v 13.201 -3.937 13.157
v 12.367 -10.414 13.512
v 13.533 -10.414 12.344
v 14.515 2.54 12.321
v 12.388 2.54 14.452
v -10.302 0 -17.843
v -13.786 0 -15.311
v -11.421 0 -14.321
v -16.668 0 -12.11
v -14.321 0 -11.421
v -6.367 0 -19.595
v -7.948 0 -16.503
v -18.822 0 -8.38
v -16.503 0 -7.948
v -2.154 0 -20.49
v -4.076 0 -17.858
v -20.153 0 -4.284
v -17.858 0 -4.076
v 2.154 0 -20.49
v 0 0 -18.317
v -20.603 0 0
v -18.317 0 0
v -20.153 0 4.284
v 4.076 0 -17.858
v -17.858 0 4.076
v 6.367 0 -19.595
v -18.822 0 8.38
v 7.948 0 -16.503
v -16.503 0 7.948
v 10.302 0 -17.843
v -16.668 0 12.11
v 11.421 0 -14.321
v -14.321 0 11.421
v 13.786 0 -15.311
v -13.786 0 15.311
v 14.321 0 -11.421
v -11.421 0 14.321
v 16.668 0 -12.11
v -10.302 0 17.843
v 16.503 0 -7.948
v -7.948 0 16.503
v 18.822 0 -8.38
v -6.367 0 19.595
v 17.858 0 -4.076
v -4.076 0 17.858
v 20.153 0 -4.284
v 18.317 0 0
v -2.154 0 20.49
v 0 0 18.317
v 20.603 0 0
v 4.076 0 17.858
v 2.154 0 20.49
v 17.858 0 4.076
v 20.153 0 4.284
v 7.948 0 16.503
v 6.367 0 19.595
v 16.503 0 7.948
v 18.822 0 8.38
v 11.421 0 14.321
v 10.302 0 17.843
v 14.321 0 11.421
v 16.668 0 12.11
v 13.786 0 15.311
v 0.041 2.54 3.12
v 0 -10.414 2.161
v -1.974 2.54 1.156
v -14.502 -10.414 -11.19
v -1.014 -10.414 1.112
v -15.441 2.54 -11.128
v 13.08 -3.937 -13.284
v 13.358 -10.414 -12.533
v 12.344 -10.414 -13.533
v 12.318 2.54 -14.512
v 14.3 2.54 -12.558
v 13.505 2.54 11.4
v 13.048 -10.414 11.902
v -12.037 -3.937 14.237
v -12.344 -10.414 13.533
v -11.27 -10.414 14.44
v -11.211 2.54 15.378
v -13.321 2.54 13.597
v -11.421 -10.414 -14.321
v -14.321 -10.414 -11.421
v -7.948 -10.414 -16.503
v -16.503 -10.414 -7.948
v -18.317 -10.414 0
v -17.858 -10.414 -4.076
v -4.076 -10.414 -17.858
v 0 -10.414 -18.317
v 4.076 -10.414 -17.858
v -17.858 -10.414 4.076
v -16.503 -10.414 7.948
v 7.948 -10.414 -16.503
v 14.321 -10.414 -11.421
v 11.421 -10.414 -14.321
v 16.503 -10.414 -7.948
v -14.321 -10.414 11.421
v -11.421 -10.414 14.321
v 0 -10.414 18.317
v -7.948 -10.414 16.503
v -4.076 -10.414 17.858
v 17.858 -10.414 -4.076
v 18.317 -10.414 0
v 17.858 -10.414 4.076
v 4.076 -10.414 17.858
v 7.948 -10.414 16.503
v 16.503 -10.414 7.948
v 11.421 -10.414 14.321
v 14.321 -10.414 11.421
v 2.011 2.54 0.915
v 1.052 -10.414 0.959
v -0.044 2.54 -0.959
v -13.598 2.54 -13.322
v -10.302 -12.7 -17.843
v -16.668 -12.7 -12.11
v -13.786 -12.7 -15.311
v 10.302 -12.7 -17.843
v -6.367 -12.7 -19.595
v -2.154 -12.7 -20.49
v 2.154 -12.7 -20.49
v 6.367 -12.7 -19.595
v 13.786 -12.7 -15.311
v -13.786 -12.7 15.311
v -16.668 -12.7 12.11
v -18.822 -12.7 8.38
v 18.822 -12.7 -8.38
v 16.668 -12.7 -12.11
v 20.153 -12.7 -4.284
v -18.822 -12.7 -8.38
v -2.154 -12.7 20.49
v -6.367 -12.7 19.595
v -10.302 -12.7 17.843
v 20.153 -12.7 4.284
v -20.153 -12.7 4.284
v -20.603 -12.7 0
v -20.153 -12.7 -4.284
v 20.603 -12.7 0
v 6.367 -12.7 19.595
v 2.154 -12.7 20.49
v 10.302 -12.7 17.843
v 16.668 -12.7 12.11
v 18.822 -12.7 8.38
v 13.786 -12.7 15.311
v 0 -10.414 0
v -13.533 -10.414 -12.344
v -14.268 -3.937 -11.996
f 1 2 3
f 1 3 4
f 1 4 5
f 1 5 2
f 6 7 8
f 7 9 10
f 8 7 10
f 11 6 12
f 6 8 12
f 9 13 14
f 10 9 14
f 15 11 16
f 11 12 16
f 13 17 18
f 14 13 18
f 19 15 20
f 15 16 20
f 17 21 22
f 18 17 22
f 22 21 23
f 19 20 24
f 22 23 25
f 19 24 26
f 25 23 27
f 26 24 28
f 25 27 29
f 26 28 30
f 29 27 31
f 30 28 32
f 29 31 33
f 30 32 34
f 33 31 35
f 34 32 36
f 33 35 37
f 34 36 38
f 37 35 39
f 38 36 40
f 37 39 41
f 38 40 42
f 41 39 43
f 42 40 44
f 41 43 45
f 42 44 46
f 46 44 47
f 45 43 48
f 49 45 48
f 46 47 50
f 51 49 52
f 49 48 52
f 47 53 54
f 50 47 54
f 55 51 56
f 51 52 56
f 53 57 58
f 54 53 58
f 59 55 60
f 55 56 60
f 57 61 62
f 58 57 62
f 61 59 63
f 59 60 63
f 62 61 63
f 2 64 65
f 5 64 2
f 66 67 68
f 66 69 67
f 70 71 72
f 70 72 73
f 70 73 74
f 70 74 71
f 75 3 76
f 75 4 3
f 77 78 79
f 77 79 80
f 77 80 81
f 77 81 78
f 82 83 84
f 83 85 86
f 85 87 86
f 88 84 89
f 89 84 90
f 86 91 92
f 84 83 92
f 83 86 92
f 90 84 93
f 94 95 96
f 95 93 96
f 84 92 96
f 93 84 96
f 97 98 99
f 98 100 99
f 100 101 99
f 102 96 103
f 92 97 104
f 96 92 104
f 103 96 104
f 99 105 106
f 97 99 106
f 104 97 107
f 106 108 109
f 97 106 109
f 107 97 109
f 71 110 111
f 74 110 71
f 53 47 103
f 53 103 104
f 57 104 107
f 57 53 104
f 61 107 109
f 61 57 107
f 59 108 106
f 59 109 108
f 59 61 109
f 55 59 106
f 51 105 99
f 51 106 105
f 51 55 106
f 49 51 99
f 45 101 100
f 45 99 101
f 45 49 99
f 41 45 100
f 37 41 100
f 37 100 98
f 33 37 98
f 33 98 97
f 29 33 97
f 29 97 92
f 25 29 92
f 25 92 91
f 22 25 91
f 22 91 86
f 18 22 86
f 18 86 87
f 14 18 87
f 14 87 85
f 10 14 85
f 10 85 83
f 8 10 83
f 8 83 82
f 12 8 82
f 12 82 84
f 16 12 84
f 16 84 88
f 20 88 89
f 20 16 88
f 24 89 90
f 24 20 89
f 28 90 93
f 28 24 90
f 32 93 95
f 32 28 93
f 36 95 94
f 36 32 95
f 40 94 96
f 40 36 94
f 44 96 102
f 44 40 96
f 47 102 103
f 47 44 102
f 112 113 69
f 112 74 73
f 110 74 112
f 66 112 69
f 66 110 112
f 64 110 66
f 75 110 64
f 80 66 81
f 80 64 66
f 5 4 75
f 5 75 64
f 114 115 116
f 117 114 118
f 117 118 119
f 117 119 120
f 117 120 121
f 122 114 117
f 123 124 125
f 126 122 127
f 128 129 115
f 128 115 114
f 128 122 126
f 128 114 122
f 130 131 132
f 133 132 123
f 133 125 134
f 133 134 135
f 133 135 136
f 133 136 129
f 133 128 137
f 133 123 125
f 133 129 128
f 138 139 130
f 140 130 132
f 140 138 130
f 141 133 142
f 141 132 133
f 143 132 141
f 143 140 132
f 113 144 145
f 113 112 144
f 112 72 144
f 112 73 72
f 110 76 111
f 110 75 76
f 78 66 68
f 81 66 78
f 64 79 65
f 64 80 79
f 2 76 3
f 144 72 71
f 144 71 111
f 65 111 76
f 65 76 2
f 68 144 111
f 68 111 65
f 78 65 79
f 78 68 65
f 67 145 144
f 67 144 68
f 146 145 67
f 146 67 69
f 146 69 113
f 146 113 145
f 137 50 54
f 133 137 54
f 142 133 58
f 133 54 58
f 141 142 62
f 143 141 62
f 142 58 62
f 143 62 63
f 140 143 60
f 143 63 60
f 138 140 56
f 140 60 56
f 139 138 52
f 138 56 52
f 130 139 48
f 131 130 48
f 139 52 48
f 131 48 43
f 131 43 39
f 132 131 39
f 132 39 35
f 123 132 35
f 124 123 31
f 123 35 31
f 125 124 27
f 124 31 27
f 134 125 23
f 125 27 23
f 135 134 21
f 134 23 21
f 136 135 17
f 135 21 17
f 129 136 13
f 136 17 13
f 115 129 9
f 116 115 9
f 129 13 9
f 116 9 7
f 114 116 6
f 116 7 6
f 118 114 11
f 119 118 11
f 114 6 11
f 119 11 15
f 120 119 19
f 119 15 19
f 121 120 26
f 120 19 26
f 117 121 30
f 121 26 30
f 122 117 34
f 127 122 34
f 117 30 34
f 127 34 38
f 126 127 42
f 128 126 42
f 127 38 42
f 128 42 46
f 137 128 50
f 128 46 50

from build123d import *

# Parameters (mm, degrees)
F0_R     = 20.6032512537
F1_DEPTH = 12.7
F2_T     = -2.286
F4_DEPTH = 12.954
F4_TAPER = -3


with BuildPart() as f1:
    # F0 (on Front) → F1 (new body)
    with BuildSketch(Plane.XZ):
        Circle(F0_R)
    extrude(amount=F1_DEPTH)

    # F2
    f2_openings = [f1.faces().sort_by_distance(p)[0] for p in [
        (0, 0, 0),
    ]]
    offset(amount=F2_T, openings=f2_openings)


with BuildPart() as f4:
    # F3 (on face) → F4 (new body)
    with BuildSketch(Plane(origin=(0, -10.414, 0), x_dir=(-1, 0, 0), z_dir=(0, 1, 0))):
        Polygon((-12.3441766776, -13.5330334975), (0, 0), (13.5330334975, -12.3441766776), (14.5017178557, -11.1902579383), (1.014461328, 1.112163208), (12.3441766776, 13.5330334975), (11.2704234996, 14.4395030258), (0, 2.1605880465), (-12.3671734121, 13.51202114), (-13.5330334975, 12.3441766776), (-13.0478517911, 11.9016174609), (-1.0516488317, 0.9592630494), (-13.3584970167, -12.5328468812), align=None)
    extrude(amount=F4_DEPTH, taper=F4_TAPER)


solid = Compound([f1.part, f4.part])
